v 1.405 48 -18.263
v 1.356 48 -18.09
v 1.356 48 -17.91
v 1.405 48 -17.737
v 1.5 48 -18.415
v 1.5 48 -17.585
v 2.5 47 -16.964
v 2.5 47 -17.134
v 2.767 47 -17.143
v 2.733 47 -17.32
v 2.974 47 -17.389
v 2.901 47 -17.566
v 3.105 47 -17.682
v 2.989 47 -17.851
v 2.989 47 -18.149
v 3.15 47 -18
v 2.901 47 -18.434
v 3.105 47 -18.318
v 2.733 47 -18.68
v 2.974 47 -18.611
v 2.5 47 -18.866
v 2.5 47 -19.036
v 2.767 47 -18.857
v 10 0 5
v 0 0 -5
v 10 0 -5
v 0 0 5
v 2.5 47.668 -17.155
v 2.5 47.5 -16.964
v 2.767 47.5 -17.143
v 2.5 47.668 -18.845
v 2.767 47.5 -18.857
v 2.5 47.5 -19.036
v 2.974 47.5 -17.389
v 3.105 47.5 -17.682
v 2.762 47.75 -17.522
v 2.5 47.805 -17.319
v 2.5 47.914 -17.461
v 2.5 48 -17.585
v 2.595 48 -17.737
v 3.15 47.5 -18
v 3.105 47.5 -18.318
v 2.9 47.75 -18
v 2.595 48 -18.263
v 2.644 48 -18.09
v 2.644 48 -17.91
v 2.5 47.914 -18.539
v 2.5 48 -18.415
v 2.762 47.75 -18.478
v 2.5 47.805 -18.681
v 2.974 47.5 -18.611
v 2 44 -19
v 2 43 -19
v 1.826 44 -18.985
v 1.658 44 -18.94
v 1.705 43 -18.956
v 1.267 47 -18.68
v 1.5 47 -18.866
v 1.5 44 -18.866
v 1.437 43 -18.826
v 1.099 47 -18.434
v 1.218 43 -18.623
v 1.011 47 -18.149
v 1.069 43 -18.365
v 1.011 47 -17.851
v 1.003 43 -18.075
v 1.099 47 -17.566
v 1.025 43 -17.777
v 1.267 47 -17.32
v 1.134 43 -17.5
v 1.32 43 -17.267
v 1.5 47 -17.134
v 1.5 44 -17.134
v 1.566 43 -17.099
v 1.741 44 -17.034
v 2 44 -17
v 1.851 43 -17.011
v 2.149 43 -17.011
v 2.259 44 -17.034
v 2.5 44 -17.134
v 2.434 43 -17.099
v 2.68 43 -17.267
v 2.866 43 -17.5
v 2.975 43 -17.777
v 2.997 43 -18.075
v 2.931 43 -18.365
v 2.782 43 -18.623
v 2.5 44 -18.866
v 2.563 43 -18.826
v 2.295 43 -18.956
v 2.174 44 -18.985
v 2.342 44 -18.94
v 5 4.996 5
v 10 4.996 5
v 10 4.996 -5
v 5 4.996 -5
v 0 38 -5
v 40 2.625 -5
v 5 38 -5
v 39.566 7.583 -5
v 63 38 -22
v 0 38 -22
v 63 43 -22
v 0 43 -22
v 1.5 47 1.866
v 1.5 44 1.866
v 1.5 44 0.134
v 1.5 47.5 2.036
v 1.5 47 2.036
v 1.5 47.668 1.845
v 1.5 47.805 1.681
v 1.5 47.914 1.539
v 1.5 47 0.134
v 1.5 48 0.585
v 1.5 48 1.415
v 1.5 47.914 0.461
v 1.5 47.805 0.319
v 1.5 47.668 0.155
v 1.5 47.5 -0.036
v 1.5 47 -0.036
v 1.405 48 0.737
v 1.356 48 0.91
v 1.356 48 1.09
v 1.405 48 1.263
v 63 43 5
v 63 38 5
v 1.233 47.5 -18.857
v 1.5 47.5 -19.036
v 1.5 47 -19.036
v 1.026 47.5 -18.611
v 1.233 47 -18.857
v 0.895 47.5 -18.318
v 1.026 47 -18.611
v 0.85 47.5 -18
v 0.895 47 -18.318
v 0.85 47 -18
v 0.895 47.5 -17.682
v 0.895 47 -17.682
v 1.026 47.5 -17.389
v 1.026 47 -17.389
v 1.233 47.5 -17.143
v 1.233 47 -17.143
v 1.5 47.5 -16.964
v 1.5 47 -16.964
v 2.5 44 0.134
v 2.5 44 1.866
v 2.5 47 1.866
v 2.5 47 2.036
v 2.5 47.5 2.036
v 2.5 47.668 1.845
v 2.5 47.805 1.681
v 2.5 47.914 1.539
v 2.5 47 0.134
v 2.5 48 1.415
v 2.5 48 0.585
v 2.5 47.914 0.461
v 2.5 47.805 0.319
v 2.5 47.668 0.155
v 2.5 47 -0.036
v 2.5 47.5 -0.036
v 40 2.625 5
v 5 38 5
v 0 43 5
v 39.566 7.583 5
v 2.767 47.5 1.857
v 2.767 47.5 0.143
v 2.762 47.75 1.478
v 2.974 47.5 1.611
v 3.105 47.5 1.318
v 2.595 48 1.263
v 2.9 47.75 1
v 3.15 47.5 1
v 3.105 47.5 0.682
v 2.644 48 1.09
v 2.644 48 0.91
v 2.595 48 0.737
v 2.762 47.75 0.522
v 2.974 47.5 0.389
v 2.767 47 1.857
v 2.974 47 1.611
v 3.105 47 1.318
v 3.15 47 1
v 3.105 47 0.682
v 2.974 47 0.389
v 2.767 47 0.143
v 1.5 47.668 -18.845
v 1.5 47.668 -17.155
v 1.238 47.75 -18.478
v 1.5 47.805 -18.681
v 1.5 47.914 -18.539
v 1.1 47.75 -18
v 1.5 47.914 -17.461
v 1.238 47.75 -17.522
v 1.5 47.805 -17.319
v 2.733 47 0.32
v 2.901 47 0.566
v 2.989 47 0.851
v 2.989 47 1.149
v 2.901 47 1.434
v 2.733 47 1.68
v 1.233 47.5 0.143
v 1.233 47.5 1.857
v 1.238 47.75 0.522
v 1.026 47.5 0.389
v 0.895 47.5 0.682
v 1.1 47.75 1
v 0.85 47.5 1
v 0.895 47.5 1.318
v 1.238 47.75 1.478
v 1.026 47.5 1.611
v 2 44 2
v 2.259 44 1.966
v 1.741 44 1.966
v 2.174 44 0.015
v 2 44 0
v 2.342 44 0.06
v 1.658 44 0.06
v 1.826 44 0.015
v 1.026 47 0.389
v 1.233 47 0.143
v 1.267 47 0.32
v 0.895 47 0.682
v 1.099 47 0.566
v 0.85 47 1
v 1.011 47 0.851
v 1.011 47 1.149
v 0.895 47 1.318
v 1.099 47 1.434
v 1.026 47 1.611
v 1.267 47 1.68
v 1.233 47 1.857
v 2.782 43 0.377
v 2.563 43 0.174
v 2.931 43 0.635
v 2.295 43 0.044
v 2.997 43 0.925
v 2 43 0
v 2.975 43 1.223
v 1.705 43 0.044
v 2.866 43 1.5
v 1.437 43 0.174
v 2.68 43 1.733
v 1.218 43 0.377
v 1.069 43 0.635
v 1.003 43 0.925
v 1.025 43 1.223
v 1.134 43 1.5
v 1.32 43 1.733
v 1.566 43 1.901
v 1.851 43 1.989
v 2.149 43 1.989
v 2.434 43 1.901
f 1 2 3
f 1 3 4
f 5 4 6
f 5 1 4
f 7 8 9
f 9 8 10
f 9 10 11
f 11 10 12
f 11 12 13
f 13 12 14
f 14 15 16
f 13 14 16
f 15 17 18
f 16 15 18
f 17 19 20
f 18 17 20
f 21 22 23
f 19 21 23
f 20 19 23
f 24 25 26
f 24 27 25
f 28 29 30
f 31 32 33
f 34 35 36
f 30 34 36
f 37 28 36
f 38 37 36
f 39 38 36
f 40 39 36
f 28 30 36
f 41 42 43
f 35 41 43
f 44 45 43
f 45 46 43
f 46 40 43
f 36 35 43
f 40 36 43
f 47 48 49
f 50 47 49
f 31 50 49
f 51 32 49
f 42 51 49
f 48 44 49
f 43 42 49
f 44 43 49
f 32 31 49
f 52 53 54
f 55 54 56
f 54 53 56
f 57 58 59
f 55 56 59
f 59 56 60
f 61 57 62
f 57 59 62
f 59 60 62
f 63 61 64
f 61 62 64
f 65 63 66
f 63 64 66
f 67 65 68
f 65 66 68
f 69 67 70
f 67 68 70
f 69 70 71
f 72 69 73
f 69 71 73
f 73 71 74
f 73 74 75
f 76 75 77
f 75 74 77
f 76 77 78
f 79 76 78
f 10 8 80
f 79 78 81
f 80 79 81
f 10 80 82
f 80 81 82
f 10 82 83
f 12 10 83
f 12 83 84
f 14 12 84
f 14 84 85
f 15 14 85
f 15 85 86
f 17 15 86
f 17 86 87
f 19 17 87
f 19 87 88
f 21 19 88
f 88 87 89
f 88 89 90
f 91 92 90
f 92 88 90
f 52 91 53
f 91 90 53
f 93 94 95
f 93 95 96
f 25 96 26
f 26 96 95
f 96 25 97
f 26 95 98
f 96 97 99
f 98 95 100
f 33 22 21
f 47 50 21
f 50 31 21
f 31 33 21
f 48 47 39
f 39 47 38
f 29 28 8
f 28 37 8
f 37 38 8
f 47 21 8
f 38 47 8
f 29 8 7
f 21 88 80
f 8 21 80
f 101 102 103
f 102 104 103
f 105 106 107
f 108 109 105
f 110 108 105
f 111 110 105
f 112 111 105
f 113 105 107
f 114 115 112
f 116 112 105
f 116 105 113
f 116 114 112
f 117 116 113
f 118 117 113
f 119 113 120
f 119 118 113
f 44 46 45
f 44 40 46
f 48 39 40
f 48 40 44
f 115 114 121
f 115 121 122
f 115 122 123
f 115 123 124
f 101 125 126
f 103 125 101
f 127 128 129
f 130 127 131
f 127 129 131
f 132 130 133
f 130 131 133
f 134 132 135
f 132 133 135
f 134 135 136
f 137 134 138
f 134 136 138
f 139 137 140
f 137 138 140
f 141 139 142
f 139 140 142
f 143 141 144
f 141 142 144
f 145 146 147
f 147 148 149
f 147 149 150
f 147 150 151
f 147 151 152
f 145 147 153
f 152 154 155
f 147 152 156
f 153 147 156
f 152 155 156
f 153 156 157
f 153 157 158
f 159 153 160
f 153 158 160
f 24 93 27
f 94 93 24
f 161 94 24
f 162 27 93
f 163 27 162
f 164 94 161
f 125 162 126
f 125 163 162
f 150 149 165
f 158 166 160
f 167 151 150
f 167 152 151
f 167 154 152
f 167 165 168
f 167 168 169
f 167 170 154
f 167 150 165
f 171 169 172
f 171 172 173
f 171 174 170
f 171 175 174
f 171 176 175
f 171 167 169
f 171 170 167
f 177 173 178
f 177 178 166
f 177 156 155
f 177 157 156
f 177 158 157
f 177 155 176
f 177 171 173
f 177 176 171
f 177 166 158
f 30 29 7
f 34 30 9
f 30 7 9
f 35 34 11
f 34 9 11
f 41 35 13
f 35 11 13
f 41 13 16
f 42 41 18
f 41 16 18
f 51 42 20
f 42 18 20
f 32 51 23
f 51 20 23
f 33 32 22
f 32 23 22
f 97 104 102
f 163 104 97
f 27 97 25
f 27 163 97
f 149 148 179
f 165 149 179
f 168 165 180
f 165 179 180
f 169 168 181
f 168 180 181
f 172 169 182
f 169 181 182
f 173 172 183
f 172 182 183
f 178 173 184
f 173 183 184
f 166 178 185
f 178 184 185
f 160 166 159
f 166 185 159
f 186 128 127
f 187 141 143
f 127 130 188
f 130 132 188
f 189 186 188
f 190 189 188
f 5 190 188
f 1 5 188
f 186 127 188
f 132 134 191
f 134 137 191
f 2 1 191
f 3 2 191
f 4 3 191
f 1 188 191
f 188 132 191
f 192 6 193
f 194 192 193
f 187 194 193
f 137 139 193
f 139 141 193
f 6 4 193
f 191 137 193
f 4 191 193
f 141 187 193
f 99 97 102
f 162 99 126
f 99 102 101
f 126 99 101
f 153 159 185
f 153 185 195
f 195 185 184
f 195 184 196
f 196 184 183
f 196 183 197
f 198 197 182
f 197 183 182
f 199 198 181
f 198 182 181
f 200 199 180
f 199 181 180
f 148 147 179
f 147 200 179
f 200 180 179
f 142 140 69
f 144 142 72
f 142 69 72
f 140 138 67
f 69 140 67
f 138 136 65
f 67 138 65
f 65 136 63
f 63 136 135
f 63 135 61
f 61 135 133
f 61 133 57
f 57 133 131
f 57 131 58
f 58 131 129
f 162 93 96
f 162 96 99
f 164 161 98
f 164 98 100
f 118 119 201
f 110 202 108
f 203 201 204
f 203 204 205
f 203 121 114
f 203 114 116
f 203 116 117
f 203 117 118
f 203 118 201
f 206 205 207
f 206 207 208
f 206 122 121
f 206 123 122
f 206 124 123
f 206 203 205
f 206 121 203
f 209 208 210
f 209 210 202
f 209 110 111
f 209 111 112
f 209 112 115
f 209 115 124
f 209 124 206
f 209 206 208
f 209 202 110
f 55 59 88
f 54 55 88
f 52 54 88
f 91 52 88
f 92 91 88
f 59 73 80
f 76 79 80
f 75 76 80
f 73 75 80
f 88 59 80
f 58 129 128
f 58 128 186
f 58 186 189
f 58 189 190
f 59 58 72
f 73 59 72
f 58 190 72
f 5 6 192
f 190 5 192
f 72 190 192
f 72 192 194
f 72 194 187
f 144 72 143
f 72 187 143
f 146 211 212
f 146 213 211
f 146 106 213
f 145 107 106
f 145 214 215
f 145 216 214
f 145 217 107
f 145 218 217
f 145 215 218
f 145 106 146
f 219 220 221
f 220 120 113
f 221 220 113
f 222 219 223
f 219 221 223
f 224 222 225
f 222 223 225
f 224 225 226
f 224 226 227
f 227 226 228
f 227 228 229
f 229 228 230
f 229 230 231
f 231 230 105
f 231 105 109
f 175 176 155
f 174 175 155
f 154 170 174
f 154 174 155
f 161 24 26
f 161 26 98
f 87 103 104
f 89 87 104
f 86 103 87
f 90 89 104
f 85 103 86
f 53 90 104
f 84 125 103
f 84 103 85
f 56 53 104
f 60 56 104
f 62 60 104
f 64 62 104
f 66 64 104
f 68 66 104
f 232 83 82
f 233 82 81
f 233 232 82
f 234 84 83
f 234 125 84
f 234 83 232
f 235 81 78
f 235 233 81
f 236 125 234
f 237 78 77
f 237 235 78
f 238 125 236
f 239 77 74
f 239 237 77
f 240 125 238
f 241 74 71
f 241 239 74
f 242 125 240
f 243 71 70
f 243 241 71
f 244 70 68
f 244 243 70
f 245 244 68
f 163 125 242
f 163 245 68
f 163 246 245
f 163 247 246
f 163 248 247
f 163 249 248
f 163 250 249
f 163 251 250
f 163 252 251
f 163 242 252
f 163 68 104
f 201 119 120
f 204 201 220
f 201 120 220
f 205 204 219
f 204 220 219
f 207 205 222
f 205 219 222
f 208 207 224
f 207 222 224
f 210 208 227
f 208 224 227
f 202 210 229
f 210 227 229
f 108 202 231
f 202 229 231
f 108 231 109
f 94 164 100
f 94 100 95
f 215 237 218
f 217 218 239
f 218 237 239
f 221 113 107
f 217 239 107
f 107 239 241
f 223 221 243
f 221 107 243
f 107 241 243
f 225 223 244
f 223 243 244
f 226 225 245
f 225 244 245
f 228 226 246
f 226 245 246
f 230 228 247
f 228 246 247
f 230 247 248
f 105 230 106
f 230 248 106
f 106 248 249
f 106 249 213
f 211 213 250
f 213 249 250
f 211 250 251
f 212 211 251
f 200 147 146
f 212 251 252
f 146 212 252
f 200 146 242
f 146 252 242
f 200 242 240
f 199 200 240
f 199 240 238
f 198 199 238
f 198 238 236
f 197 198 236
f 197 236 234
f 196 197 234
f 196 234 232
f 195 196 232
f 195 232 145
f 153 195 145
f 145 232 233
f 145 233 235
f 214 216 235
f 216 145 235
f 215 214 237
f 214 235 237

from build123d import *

# Parameters (mm, degrees)
BOSS_EXTRUDE1_DEPTH = 5
SKETCH3_W           = 63
SKETCH3_H           = 27
BOSS_EXTRUDE3_DEPTH = 2.5
SKETCH4_R           = 1
BOSS_EXTRUDE6_DEPTH = 4
SKETCH5_W           = 1
SKETCH5_H           = 3.04418771
CUT_EXTRUDE1_DEPTH  = 3
SKETCH6_R           = 1.15
BOSS_EXTRUDE7_DEPTH = 1
CHAMFER1_SIZE       = 0.5
SKETCH7_W           = 1
SKETCH7_H           = 2.786400566
CUT_EXTRUDE3_DEPTH  = 1
MIRROR2_START       = 47
MIRROR2_DEPTH       = 1


with BuildPart() as part:
    # Sketch1 → Boss-Extrude1 (new, symmetric)
    with BuildSketch(Plane.XY):
        Polygon((0, 0), (10, 0), (40, 2.624659906), (39.566186352, 7.583172591), (10, 4.996466462), (5, 4.996466462), (5, 38.996466462), (50, 38.996466462), (50, 43), (0, 43), align=None)
    extrude(amount=BOSS_EXTRUDE1_DEPTH, both=True)

    # Sketch3 → Boss-Extrude3 (add, symmetric)
    with BuildSketch(Plane(origin=(0, 40.5, 0), x_dir=(1, 0, 0), z_dir=(0, 1, 0))):
        with Locations((31.5, 8.5)):
            Rectangle(SKETCH3_W, SKETCH3_H)
    extrude(amount=BOSS_EXTRUDE3_DEPTH, both=True)

    # Sketch4 → Boss-Extrude6 (add)
    with BuildSketch(Plane(origin=(0, 43, 0), x_dir=(1, 0, 0), z_dir=(0, 1, 0))):
        with Locations(Location((2, -1, 0), (0, 0, 90))):
            Circle(SKETCH4_R)
        with Locations(Location((2, 18, 0), (0, 0, 90))):
            Circle(SKETCH4_R)
    extrude(amount=BOSS_EXTRUDE6_DEPTH)

    # Sketch5 → Cut-Extrude1 (cut)
    with BuildSketch(Plane(origin=(0, 47, 0), x_dir=(1, 0, 0), z_dir=(0, 1, 0))):
        with Locations((2, -1)):
            Rectangle(SKETCH5_W, SKETCH5_H)
    cut_extrude1 = extrude(amount=-CUT_EXTRUDE1_DEPTH, mode=Mode.SUBTRACT)

    # Mirror1: Cut-Extrude1 across plane
    add(cut_extrude1.mirror(Plane.XY.offset(-8.5)), mode=Mode.SUBTRACT)

    # Sketch6 → Boss-Extrude7 (add)
    with BuildSketch(Plane(origin=(0, 47, 0), x_dir=(1, 0, 0), z_dir=(0, 1, 0))):
        with Locations(Location((2, -1, 0), (0, 0, 270))):
            Circle(SKETCH6_R)
    extrude(amount=BOSS_EXTRUDE7_DEPTH)

    # Chamfer1
    chamfer1_edges = [part.edges().sort_by_distance(p)[0] for p in [
        (2, 48, -0.15),
    ]]
    chamfer(chamfer1_edges, length=CHAMFER1_SIZE)

    # Sketch7 → Cut-Extrude3 (cut)
    with BuildSketch(Plane(origin=(0, 48, 0), x_dir=(1, 0, 0), z_dir=(0, 1, 0))):
        with Locations((2, -1)):
            Rectangle(SKETCH7_W, SKETCH7_H)
    extrude(amount=-CUT_EXTRUDE3_DEPTH, mode=Mode.SUBTRACT)

    # Mirror2: read off the stored shape, not the designer's step
    # Mirror2 outline → Mirror2 (add)
    with BuildSketch(Plane(origin=(0, 0, 0), x_dir=(1, 0, 0), z_dir=(0, 1, 0)).offset(MIRROR2_START)):
        with BuildLine():
            ThreePointArc((2.5, 16.964384241), (3.15, 18), (2.5, 19.035615759))
            Line((2.5, 19.035615759), (2.5, 16.964384241))
        make_face()
        with BuildLine():
            ThreePointArc((1.5, 19.035615759), (0.85, 18), (1.5, 16.964384241))
            Line((1.5, 16.964384241), (1.5, 19.035615759))
        make_face()
    extrude(amount=MIRROR2_DEPTH)

    # Mirror2 2 outline → Mirror2 2 (revolve, cut)
    with BuildSketch(Plane(origin=(2, 0, -18), x_dir=(1, 0, 0), z_dir=(0, 0, 1))):
        Polygon((1.150000012, 48.000000304), (0.649999696, 48.000000304), (1.150000012, 47.499999988), align=None)
    revolve(axis=Axis((2, 0, -18), (0, 1, 0)), mode=Mode.SUBTRACT)


solid = part.part
